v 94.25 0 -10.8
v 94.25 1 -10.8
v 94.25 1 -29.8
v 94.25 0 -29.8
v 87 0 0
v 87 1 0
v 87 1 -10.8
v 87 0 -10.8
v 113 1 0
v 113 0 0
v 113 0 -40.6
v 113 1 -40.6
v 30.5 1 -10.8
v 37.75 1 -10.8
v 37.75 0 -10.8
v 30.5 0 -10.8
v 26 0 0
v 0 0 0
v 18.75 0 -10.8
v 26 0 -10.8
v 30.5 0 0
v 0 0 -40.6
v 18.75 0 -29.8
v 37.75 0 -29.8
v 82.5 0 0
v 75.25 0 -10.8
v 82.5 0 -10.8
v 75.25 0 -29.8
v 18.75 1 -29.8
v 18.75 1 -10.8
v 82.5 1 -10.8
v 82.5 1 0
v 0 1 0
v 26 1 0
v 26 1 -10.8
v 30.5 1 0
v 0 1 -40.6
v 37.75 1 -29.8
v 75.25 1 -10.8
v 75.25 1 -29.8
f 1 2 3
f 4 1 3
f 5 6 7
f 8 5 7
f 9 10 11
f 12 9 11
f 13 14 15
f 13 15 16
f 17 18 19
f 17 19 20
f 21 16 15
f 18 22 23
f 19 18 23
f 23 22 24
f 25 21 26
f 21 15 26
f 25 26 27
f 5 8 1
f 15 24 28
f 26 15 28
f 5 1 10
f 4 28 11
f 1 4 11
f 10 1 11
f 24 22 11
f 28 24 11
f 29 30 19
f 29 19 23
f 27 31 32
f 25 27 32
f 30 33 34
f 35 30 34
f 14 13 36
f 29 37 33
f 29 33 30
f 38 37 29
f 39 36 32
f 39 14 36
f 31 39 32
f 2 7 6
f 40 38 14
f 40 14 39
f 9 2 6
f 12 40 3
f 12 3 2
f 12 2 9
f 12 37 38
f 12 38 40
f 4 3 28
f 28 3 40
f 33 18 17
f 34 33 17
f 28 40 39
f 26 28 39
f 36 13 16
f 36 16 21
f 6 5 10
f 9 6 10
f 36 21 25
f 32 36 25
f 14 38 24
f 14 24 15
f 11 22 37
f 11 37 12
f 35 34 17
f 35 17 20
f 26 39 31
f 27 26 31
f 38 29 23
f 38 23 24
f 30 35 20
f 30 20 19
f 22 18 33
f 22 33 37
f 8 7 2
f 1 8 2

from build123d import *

# Parameters (mm, degrees)
SKETCH1_W           = 113
SKETCH1_H           = 40.6
BOSS_EXTRUDE1_DEPTH = 1
CUT_EXTRUDE1_DEPTH  = 121.076475631


with BuildPart() as part:
    # Sketch1 → Boss-Extrude1 (new body)
    with BuildSketch(Plane(origin=(0, 0, 0), x_dir=(1, 0, 0), z_dir=(0, 1, 0))):
        with Locations((56.5, 20.3)):
            Rectangle(SKETCH1_W, SKETCH1_H)
    extrude(amount=BOSS_EXTRUDE1_DEPTH)

    # Sketch2 → Cut-Extrude1 (cut, through all)
    with BuildSketch(Plane(origin=(0, 1, 0), x_dir=(1, 0, 0), z_dir=(0, 1, 0))):
        Polygon((37.75, 10.8), (30.5, 10.8), (30.5, 0), (26, 0), (26, 10.8), (18.75, 10.8), (18.75, 29.8), (37.75, 29.8), align=None)
    cut_extrude1 = extrude(amount=-CUT_EXTRUDE1_DEPTH, mode=Mode.SUBTRACT)

    # Mirror1: Cut-Extrude1 across plane
    add(cut_extrude1.mirror(Plane.ZY.offset(-56.5)), mode=Mode.SUBTRACT)


solid = part.part
